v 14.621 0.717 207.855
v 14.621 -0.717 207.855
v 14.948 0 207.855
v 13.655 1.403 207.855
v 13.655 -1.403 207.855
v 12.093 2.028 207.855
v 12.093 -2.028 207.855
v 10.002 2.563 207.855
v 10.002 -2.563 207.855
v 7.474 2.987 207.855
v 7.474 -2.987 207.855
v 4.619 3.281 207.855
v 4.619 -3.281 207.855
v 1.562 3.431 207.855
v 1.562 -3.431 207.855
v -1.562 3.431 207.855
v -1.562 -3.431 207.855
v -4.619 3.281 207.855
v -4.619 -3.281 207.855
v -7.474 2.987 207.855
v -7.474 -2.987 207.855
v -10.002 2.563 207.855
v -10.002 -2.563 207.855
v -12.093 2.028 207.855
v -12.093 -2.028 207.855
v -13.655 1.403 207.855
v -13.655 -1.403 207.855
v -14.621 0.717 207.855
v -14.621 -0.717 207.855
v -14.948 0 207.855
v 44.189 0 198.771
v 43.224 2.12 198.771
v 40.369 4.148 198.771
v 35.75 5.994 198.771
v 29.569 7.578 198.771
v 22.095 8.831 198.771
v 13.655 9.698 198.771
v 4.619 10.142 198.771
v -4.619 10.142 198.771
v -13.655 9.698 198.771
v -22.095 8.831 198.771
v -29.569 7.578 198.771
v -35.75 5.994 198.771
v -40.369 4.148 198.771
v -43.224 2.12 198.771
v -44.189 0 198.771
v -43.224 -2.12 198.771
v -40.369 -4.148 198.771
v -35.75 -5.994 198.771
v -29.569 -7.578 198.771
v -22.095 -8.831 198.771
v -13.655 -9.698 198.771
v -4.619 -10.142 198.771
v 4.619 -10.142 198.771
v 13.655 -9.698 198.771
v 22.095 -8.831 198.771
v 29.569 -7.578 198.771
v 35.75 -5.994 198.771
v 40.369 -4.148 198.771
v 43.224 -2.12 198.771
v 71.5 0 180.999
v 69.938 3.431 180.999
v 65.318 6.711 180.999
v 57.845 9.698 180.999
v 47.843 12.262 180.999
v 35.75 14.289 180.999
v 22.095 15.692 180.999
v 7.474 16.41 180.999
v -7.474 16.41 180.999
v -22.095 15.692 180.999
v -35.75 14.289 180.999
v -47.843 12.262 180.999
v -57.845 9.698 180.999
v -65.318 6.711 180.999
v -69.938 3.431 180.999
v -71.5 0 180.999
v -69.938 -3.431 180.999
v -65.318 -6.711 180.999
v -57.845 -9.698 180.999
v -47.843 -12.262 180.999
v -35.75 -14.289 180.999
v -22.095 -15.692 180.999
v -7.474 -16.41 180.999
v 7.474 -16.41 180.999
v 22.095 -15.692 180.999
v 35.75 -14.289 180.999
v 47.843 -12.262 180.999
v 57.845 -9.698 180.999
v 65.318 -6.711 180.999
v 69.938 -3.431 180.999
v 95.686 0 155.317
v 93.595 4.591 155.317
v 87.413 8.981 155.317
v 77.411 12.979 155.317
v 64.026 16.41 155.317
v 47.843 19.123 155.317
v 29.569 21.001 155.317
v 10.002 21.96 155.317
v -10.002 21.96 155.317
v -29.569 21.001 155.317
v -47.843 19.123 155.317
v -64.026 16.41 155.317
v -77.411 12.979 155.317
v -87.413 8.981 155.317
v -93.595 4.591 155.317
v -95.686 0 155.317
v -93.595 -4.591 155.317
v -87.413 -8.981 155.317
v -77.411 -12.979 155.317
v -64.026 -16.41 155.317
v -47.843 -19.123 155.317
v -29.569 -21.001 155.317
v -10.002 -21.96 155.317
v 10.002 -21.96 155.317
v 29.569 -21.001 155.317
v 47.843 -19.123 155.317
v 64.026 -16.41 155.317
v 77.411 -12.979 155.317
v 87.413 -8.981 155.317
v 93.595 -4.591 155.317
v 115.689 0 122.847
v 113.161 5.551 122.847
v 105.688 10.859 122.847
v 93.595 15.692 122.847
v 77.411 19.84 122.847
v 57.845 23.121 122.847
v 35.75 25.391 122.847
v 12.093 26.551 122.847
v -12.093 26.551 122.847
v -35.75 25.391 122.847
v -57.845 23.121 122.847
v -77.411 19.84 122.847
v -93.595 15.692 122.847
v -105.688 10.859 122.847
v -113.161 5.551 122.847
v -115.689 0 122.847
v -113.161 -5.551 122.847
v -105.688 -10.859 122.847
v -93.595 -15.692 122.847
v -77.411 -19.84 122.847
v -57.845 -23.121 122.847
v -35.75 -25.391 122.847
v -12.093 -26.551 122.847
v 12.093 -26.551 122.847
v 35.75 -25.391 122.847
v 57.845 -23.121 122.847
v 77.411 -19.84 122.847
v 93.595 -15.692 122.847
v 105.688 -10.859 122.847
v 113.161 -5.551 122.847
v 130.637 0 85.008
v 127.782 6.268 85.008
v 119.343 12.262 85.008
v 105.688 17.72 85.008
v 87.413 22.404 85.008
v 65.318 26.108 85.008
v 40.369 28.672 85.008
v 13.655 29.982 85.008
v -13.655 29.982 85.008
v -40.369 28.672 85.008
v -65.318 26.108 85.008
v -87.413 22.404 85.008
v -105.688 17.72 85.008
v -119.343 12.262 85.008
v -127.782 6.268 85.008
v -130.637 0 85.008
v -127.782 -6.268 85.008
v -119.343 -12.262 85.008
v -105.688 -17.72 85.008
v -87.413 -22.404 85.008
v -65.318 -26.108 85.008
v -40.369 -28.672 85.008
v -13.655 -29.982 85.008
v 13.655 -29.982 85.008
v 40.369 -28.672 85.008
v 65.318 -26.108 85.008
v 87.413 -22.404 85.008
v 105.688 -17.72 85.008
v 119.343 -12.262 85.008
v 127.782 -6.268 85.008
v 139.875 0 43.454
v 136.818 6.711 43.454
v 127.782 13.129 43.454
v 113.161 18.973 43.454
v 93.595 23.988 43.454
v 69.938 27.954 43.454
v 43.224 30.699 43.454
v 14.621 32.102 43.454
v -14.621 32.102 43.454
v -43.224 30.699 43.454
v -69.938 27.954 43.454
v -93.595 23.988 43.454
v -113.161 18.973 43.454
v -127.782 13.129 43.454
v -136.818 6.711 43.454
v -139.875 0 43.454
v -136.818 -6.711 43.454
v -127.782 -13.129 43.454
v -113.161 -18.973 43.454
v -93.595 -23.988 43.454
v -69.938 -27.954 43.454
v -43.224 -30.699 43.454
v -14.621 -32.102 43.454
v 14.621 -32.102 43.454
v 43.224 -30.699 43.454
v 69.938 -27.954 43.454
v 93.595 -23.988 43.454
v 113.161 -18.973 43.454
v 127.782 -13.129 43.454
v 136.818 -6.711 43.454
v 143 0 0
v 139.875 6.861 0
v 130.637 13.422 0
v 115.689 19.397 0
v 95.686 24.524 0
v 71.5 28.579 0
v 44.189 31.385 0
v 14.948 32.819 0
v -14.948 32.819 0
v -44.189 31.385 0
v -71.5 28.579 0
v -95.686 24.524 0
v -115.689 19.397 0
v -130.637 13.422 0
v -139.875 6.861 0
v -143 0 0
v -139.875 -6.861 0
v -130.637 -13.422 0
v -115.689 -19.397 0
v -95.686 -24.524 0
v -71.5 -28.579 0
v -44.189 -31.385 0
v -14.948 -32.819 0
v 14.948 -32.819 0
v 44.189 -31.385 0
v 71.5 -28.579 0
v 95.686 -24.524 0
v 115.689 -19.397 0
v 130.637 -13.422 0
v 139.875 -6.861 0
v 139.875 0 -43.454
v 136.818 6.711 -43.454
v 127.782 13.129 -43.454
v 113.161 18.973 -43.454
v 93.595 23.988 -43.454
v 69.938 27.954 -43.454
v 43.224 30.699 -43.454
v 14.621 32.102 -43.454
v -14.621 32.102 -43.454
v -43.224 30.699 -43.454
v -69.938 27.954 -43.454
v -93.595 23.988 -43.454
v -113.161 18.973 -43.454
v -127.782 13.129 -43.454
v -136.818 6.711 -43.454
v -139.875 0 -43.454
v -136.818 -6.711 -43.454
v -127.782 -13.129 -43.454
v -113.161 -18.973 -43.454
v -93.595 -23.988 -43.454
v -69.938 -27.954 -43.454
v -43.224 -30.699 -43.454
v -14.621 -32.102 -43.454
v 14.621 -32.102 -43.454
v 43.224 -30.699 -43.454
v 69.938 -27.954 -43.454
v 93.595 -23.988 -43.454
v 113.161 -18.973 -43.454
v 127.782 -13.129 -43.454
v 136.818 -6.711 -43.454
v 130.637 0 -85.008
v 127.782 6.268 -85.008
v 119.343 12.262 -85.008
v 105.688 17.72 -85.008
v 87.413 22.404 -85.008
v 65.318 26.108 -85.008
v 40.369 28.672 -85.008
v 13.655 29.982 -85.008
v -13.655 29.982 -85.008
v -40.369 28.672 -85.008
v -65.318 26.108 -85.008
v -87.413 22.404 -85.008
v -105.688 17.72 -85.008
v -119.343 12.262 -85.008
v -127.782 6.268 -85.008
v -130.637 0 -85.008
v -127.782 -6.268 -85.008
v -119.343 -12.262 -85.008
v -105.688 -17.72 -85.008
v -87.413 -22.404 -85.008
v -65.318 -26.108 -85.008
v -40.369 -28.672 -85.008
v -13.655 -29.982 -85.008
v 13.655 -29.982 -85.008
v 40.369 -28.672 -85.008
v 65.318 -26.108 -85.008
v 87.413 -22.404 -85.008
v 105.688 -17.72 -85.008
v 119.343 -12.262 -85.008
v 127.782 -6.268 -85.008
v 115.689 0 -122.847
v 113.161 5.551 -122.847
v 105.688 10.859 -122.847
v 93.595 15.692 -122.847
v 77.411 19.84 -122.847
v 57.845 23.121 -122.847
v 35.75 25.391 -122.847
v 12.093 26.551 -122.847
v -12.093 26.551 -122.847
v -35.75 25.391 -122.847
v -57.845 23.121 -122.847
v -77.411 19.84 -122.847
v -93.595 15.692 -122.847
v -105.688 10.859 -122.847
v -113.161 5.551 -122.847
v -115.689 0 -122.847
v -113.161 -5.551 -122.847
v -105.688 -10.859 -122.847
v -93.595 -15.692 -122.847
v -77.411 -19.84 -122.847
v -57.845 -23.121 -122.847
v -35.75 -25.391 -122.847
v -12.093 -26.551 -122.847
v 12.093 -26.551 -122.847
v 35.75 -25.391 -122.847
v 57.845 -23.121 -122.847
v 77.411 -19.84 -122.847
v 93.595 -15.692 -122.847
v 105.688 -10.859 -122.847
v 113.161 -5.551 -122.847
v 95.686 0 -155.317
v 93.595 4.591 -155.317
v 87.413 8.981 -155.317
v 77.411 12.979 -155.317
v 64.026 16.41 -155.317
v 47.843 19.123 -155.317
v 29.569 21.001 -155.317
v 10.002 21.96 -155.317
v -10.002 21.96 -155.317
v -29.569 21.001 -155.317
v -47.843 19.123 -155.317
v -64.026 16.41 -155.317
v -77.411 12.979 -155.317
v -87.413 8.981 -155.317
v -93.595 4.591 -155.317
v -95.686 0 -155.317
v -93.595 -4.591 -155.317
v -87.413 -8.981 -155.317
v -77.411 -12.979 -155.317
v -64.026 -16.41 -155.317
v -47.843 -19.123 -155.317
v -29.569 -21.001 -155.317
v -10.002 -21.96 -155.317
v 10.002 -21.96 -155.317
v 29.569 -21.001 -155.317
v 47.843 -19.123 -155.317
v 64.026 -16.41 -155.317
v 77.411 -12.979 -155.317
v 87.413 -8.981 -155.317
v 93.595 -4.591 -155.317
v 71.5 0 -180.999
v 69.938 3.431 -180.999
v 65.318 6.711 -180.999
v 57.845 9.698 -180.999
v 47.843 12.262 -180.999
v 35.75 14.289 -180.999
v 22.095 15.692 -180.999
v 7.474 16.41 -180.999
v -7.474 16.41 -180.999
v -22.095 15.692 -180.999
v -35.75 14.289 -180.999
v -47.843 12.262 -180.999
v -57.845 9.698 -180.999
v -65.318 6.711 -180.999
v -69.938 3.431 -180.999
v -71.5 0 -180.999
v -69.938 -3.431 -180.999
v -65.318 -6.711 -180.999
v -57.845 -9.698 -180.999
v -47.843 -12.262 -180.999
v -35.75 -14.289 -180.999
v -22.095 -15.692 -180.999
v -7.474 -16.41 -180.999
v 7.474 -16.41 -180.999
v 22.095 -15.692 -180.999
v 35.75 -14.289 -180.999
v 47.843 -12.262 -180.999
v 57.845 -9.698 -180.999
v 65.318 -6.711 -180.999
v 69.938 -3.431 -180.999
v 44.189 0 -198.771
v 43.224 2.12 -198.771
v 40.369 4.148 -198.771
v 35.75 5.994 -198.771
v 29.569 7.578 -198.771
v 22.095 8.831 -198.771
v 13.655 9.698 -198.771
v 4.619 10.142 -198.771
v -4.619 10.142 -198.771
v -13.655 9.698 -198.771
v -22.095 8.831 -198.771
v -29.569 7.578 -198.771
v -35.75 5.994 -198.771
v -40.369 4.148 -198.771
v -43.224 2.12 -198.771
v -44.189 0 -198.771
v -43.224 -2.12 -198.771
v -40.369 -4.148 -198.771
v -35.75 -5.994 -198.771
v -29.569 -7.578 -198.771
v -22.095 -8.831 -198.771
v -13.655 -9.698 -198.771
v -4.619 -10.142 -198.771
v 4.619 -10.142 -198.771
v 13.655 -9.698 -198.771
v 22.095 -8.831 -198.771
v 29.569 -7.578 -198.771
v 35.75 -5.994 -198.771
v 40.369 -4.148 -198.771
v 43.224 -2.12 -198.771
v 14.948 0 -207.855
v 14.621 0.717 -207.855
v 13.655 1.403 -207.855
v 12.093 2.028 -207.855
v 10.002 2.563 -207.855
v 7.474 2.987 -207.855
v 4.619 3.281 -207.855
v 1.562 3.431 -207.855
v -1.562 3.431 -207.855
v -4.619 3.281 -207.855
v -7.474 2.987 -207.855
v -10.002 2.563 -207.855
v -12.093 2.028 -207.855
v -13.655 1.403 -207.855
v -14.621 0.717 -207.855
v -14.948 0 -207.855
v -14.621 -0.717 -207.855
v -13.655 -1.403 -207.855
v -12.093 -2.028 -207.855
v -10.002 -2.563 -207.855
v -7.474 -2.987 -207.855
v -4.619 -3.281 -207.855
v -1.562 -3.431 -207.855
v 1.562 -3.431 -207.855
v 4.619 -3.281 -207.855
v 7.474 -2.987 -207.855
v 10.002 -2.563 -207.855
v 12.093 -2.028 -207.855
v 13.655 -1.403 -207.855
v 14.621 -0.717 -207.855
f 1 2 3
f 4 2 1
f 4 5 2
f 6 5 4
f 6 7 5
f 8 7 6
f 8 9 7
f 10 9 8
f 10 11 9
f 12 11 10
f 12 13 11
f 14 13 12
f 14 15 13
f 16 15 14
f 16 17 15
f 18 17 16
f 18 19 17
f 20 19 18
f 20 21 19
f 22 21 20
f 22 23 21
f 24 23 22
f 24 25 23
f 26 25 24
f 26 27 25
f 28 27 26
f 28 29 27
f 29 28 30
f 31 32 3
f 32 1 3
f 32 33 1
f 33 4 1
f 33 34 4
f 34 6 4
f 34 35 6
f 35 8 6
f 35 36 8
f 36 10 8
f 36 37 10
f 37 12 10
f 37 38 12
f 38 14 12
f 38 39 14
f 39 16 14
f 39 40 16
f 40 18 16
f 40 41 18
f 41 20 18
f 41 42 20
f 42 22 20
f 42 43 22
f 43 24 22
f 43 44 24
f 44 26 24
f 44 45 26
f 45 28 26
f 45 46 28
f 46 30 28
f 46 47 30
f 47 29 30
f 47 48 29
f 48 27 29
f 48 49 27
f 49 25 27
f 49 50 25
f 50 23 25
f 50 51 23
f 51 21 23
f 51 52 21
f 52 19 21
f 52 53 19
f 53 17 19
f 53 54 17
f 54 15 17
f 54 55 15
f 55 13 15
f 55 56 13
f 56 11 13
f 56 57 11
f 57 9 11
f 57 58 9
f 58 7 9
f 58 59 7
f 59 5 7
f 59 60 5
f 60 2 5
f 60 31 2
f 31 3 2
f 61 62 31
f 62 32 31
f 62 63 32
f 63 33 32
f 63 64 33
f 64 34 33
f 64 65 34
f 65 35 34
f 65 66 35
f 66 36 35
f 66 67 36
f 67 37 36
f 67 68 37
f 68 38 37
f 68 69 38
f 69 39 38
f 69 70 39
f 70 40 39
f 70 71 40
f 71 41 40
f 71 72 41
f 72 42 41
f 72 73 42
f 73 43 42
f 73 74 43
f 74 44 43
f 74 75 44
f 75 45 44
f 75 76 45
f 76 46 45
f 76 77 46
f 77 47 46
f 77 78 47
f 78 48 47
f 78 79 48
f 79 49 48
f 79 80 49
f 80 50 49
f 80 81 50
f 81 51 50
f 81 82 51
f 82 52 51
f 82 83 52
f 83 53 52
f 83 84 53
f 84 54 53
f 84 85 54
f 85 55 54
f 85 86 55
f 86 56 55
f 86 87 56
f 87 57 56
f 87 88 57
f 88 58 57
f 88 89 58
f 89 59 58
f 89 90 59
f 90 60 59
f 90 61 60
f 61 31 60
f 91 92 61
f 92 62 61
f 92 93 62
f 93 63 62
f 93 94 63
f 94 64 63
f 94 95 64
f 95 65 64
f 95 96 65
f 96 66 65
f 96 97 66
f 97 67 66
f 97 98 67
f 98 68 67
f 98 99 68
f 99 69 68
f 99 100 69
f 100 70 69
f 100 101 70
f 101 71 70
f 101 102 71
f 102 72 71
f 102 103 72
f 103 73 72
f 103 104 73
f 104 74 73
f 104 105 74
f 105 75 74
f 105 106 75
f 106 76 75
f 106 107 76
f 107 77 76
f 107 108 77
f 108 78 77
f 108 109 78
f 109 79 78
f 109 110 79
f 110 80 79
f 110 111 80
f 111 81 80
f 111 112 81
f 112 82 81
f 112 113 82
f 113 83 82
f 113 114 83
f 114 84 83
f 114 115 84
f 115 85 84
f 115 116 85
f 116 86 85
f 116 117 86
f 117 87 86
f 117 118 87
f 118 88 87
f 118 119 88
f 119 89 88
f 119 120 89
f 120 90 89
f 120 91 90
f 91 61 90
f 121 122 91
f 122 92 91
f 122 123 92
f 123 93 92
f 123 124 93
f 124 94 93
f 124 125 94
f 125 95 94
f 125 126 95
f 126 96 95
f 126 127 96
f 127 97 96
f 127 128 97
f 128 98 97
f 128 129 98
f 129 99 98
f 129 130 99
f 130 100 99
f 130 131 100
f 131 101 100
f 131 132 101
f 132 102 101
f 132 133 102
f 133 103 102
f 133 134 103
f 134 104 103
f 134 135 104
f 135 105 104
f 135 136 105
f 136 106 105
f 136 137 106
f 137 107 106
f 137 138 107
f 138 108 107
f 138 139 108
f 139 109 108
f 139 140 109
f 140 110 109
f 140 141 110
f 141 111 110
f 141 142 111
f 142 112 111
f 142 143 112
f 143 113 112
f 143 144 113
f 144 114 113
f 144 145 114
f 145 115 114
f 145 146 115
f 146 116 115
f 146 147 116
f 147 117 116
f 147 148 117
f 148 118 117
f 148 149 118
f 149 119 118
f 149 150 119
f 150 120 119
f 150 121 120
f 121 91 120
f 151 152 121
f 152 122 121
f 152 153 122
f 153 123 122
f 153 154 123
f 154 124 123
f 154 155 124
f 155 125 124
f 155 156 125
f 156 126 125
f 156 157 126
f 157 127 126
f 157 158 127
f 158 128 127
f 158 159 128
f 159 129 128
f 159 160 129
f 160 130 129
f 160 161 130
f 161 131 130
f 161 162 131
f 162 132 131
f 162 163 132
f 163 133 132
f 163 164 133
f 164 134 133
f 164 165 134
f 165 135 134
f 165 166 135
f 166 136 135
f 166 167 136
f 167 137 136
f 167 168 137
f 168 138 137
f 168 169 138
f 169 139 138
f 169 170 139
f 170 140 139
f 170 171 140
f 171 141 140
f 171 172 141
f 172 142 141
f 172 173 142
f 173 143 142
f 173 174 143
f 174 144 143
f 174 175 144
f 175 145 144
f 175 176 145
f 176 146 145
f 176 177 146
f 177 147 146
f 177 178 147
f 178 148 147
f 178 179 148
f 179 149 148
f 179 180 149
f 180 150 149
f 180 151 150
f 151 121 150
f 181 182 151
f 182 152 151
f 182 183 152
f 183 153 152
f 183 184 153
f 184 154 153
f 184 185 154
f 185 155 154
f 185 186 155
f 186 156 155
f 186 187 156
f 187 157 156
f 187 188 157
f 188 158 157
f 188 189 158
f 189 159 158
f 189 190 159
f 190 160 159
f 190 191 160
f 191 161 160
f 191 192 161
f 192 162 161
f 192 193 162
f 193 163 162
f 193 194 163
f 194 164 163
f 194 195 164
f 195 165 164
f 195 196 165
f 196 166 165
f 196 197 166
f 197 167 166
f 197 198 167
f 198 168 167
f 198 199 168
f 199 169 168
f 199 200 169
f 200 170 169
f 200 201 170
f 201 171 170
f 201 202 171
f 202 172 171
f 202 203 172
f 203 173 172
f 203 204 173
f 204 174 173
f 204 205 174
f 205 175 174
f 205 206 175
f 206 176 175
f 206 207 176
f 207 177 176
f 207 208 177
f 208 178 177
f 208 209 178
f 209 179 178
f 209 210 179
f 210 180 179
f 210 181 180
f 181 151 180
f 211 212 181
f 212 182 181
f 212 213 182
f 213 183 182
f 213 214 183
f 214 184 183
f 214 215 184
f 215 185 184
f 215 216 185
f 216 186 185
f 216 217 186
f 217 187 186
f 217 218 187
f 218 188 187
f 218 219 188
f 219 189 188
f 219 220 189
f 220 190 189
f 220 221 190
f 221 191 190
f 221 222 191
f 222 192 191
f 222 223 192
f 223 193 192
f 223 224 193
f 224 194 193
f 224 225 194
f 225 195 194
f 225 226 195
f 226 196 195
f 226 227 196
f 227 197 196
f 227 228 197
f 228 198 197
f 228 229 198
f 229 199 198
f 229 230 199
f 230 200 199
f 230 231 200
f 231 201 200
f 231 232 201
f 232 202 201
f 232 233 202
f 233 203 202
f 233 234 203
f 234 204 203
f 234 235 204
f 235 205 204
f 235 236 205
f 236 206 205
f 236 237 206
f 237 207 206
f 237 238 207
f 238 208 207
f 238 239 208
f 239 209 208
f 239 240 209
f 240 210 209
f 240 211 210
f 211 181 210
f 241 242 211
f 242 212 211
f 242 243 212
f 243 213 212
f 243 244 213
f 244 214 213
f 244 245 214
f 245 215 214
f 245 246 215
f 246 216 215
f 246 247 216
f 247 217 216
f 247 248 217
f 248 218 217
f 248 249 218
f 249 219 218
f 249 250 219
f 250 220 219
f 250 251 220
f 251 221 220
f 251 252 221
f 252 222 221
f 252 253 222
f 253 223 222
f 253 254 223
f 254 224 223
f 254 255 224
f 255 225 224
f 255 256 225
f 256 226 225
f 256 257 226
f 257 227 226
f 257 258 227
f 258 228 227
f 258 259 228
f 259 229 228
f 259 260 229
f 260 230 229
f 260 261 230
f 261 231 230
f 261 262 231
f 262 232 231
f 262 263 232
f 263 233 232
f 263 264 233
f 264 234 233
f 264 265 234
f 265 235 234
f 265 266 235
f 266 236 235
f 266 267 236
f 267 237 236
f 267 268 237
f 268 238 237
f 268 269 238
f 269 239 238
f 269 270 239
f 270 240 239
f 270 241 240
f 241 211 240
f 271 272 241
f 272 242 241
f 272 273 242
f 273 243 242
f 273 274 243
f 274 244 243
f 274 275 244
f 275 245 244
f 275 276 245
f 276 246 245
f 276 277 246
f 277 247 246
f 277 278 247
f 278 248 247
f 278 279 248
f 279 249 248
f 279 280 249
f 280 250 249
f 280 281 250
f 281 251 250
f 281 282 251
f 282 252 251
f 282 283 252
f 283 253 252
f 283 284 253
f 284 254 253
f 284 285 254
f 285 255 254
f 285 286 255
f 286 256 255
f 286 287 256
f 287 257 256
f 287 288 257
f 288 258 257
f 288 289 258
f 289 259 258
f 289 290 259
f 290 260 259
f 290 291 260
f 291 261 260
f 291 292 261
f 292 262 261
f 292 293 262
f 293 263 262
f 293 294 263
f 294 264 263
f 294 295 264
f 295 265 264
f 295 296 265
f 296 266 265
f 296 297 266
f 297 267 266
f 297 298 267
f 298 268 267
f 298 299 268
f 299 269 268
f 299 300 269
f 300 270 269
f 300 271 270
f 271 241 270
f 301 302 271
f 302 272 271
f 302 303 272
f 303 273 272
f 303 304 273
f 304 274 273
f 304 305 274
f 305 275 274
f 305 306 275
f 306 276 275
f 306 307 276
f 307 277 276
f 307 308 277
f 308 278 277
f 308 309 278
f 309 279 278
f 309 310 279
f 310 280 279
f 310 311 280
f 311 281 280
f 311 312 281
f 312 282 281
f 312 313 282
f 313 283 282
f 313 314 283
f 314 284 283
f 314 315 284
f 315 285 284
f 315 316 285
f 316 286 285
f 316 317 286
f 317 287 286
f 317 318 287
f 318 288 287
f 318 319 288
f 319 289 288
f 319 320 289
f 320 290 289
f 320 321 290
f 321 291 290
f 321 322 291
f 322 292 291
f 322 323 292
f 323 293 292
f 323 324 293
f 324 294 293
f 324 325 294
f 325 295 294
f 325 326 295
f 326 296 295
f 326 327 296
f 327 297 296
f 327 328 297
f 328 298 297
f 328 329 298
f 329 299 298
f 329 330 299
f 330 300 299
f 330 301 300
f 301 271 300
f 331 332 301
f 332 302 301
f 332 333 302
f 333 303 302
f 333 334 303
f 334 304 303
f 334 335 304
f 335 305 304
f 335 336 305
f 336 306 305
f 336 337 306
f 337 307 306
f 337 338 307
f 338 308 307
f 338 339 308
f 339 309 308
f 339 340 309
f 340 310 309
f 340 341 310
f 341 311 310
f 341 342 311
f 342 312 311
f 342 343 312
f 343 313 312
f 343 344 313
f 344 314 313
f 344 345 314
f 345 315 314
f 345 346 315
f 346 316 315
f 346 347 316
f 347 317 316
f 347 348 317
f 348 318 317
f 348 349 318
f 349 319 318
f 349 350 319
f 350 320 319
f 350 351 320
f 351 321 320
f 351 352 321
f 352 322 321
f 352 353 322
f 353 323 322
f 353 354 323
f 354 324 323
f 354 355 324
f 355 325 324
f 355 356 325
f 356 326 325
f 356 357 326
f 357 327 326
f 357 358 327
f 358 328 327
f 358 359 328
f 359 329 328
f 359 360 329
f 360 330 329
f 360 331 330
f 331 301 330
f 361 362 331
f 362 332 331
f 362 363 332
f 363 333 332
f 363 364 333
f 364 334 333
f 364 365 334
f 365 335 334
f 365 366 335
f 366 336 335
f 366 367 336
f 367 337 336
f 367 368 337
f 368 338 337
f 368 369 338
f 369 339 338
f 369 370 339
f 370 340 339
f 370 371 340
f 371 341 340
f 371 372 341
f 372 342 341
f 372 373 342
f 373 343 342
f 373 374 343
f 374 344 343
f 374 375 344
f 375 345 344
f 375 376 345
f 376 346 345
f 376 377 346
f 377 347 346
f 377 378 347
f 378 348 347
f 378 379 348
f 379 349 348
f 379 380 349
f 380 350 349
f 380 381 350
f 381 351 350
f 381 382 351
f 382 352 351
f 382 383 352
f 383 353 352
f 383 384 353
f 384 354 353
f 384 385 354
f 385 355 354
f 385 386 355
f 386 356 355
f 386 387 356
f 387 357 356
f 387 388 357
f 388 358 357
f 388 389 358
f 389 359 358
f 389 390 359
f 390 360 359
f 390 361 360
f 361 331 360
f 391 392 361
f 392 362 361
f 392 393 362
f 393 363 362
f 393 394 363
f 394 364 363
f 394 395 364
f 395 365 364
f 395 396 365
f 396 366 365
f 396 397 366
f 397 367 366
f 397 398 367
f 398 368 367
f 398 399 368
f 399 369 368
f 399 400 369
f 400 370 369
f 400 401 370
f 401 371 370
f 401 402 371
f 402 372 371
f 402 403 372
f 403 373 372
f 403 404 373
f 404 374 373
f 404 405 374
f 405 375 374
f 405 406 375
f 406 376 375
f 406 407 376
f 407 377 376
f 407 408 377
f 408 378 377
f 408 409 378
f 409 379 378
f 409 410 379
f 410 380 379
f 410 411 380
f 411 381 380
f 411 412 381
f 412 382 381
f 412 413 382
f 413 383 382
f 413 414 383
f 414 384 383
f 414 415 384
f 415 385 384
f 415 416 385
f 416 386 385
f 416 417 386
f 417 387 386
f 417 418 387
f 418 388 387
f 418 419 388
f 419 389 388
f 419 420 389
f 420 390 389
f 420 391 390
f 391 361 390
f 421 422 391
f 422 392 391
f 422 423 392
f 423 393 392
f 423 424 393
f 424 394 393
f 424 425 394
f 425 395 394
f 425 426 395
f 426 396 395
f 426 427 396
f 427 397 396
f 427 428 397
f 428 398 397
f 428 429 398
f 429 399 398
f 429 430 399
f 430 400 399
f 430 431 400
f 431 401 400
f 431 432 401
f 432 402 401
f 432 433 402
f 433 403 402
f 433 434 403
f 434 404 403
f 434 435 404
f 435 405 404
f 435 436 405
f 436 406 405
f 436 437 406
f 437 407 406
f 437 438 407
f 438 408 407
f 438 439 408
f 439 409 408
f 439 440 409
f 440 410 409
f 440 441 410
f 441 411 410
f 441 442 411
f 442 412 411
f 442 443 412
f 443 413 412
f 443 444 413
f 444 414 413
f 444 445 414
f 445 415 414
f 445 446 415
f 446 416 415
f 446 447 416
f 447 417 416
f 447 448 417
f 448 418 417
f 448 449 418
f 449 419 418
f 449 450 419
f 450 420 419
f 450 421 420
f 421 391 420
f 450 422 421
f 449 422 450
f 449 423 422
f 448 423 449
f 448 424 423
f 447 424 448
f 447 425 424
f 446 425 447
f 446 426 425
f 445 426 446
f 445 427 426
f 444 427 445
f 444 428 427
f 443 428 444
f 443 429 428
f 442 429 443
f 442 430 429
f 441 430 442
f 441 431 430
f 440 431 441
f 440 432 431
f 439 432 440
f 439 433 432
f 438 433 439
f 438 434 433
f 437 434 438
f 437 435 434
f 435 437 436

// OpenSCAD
// Generated by SolidPython 1.0.1 on 2020-07-29 00:46:50


scale(v = [13, 3, 19]) {
	sphere(r = 11);
}
/***********************************************
*********      SolidPython code:      **********
************************************************
 
# import packages: SolidPython
from solid import *
from solid.utils import *
from itertools import chain, combinations, permutations


class Resize:

    def __init__(self, scad_file):
        self.scad_file = scad_file
        #self.scad_file = import_scad(scad_file)
        # cone/cylinder param:
        self.r1 = 0
        self.r2 = 0
        self.h = 0
        # rectangular prism param:
        self.w = 0
        self.l = 0
        # ellipse param:
        self.r = 0

    # import OpenScad code (file name corresponds to shape)


    # classify shape + parameters
    def assign(self, param1, param2, param3):
        if self.scad_file == 'cone.scad':
            self.r1 = param1
            self.r2 = param2
            self.h = param3
        elif self.scad_file == 'cylinder.scad':
            self.r1 = param1
            self.r2 = param2
            self.h = param3
        elif self.scad_file == 'rectangularPrism.scad':
            self.h = param1
            self.l = param2
            self.w = param3
        else:
            self.r = param1
            self.h = param2

    # resize parameters
    def iterate(self):
        x = range(3, 20, 2)
        i = 1
        if self.scad_file == 'cone.scad':
            tempList = list(permutations(x, 2))
            for temp in tempList:
                param1 = temp[0]
                param2 = temp[1]
                filepath = 'produced_scad_files/' + 'cone' + str(param1) + '_' + str(param2) + '_' + '.scad'
                scad_render_to_file(cylinder(h=param1, r1=param2, r2=0), filepath)

        elif self.scad_file == 'cylinder.scad':
            tempList = list(permutations(x, 3))
            for temp in tempList:
                param1 = temp[0]
                param2 = temp[1]
                filepath = 'produced_scad_files/' + 'cylinder' + str(param1) + '_' + str(param2) + '_' + '.scad'
                scad_render_to_file(cylinder(h=param1, r1=param2, r2=param2), filepath)

        elif self.scad_file == 'rectangularPrism.scad':
            tempList = list(permutations(x, 3))
            for temp in tempList:
                param1 = temp[0]
                param2 = temp[1]
                param3 = temp[2]
                filepath = 'produced_scad_files/' + 'rectangularPrism' + str(param1) + '_' + str(param2) + '_' + str(
                    param3) + '.scad'
                scad_render_to_file(cube(size=(param1, param2, param3)), filepath)

        elif self.scad_file == 'ellipse.scad':
            tempList = list(permutations(x, 4))
            for temp in tempList:
                param1 = temp[0]
                param2 = temp[1]
                param3 = temp[2]
                param4 = temp[3]
                filepath = 'produced_scad_files/' + 'ellipse' + str(param1) + '_' + str(param2) + '_' + str(param3) + '_' + str(param4) + '.scad'
                scad_render_to_file(scale([param1, param2, param3])(sphere(r=param4)), filepath)

    def render_to_scadfile(self):
        scad_render_to_file(scad, 'example.scad') 
 
************************************************/
